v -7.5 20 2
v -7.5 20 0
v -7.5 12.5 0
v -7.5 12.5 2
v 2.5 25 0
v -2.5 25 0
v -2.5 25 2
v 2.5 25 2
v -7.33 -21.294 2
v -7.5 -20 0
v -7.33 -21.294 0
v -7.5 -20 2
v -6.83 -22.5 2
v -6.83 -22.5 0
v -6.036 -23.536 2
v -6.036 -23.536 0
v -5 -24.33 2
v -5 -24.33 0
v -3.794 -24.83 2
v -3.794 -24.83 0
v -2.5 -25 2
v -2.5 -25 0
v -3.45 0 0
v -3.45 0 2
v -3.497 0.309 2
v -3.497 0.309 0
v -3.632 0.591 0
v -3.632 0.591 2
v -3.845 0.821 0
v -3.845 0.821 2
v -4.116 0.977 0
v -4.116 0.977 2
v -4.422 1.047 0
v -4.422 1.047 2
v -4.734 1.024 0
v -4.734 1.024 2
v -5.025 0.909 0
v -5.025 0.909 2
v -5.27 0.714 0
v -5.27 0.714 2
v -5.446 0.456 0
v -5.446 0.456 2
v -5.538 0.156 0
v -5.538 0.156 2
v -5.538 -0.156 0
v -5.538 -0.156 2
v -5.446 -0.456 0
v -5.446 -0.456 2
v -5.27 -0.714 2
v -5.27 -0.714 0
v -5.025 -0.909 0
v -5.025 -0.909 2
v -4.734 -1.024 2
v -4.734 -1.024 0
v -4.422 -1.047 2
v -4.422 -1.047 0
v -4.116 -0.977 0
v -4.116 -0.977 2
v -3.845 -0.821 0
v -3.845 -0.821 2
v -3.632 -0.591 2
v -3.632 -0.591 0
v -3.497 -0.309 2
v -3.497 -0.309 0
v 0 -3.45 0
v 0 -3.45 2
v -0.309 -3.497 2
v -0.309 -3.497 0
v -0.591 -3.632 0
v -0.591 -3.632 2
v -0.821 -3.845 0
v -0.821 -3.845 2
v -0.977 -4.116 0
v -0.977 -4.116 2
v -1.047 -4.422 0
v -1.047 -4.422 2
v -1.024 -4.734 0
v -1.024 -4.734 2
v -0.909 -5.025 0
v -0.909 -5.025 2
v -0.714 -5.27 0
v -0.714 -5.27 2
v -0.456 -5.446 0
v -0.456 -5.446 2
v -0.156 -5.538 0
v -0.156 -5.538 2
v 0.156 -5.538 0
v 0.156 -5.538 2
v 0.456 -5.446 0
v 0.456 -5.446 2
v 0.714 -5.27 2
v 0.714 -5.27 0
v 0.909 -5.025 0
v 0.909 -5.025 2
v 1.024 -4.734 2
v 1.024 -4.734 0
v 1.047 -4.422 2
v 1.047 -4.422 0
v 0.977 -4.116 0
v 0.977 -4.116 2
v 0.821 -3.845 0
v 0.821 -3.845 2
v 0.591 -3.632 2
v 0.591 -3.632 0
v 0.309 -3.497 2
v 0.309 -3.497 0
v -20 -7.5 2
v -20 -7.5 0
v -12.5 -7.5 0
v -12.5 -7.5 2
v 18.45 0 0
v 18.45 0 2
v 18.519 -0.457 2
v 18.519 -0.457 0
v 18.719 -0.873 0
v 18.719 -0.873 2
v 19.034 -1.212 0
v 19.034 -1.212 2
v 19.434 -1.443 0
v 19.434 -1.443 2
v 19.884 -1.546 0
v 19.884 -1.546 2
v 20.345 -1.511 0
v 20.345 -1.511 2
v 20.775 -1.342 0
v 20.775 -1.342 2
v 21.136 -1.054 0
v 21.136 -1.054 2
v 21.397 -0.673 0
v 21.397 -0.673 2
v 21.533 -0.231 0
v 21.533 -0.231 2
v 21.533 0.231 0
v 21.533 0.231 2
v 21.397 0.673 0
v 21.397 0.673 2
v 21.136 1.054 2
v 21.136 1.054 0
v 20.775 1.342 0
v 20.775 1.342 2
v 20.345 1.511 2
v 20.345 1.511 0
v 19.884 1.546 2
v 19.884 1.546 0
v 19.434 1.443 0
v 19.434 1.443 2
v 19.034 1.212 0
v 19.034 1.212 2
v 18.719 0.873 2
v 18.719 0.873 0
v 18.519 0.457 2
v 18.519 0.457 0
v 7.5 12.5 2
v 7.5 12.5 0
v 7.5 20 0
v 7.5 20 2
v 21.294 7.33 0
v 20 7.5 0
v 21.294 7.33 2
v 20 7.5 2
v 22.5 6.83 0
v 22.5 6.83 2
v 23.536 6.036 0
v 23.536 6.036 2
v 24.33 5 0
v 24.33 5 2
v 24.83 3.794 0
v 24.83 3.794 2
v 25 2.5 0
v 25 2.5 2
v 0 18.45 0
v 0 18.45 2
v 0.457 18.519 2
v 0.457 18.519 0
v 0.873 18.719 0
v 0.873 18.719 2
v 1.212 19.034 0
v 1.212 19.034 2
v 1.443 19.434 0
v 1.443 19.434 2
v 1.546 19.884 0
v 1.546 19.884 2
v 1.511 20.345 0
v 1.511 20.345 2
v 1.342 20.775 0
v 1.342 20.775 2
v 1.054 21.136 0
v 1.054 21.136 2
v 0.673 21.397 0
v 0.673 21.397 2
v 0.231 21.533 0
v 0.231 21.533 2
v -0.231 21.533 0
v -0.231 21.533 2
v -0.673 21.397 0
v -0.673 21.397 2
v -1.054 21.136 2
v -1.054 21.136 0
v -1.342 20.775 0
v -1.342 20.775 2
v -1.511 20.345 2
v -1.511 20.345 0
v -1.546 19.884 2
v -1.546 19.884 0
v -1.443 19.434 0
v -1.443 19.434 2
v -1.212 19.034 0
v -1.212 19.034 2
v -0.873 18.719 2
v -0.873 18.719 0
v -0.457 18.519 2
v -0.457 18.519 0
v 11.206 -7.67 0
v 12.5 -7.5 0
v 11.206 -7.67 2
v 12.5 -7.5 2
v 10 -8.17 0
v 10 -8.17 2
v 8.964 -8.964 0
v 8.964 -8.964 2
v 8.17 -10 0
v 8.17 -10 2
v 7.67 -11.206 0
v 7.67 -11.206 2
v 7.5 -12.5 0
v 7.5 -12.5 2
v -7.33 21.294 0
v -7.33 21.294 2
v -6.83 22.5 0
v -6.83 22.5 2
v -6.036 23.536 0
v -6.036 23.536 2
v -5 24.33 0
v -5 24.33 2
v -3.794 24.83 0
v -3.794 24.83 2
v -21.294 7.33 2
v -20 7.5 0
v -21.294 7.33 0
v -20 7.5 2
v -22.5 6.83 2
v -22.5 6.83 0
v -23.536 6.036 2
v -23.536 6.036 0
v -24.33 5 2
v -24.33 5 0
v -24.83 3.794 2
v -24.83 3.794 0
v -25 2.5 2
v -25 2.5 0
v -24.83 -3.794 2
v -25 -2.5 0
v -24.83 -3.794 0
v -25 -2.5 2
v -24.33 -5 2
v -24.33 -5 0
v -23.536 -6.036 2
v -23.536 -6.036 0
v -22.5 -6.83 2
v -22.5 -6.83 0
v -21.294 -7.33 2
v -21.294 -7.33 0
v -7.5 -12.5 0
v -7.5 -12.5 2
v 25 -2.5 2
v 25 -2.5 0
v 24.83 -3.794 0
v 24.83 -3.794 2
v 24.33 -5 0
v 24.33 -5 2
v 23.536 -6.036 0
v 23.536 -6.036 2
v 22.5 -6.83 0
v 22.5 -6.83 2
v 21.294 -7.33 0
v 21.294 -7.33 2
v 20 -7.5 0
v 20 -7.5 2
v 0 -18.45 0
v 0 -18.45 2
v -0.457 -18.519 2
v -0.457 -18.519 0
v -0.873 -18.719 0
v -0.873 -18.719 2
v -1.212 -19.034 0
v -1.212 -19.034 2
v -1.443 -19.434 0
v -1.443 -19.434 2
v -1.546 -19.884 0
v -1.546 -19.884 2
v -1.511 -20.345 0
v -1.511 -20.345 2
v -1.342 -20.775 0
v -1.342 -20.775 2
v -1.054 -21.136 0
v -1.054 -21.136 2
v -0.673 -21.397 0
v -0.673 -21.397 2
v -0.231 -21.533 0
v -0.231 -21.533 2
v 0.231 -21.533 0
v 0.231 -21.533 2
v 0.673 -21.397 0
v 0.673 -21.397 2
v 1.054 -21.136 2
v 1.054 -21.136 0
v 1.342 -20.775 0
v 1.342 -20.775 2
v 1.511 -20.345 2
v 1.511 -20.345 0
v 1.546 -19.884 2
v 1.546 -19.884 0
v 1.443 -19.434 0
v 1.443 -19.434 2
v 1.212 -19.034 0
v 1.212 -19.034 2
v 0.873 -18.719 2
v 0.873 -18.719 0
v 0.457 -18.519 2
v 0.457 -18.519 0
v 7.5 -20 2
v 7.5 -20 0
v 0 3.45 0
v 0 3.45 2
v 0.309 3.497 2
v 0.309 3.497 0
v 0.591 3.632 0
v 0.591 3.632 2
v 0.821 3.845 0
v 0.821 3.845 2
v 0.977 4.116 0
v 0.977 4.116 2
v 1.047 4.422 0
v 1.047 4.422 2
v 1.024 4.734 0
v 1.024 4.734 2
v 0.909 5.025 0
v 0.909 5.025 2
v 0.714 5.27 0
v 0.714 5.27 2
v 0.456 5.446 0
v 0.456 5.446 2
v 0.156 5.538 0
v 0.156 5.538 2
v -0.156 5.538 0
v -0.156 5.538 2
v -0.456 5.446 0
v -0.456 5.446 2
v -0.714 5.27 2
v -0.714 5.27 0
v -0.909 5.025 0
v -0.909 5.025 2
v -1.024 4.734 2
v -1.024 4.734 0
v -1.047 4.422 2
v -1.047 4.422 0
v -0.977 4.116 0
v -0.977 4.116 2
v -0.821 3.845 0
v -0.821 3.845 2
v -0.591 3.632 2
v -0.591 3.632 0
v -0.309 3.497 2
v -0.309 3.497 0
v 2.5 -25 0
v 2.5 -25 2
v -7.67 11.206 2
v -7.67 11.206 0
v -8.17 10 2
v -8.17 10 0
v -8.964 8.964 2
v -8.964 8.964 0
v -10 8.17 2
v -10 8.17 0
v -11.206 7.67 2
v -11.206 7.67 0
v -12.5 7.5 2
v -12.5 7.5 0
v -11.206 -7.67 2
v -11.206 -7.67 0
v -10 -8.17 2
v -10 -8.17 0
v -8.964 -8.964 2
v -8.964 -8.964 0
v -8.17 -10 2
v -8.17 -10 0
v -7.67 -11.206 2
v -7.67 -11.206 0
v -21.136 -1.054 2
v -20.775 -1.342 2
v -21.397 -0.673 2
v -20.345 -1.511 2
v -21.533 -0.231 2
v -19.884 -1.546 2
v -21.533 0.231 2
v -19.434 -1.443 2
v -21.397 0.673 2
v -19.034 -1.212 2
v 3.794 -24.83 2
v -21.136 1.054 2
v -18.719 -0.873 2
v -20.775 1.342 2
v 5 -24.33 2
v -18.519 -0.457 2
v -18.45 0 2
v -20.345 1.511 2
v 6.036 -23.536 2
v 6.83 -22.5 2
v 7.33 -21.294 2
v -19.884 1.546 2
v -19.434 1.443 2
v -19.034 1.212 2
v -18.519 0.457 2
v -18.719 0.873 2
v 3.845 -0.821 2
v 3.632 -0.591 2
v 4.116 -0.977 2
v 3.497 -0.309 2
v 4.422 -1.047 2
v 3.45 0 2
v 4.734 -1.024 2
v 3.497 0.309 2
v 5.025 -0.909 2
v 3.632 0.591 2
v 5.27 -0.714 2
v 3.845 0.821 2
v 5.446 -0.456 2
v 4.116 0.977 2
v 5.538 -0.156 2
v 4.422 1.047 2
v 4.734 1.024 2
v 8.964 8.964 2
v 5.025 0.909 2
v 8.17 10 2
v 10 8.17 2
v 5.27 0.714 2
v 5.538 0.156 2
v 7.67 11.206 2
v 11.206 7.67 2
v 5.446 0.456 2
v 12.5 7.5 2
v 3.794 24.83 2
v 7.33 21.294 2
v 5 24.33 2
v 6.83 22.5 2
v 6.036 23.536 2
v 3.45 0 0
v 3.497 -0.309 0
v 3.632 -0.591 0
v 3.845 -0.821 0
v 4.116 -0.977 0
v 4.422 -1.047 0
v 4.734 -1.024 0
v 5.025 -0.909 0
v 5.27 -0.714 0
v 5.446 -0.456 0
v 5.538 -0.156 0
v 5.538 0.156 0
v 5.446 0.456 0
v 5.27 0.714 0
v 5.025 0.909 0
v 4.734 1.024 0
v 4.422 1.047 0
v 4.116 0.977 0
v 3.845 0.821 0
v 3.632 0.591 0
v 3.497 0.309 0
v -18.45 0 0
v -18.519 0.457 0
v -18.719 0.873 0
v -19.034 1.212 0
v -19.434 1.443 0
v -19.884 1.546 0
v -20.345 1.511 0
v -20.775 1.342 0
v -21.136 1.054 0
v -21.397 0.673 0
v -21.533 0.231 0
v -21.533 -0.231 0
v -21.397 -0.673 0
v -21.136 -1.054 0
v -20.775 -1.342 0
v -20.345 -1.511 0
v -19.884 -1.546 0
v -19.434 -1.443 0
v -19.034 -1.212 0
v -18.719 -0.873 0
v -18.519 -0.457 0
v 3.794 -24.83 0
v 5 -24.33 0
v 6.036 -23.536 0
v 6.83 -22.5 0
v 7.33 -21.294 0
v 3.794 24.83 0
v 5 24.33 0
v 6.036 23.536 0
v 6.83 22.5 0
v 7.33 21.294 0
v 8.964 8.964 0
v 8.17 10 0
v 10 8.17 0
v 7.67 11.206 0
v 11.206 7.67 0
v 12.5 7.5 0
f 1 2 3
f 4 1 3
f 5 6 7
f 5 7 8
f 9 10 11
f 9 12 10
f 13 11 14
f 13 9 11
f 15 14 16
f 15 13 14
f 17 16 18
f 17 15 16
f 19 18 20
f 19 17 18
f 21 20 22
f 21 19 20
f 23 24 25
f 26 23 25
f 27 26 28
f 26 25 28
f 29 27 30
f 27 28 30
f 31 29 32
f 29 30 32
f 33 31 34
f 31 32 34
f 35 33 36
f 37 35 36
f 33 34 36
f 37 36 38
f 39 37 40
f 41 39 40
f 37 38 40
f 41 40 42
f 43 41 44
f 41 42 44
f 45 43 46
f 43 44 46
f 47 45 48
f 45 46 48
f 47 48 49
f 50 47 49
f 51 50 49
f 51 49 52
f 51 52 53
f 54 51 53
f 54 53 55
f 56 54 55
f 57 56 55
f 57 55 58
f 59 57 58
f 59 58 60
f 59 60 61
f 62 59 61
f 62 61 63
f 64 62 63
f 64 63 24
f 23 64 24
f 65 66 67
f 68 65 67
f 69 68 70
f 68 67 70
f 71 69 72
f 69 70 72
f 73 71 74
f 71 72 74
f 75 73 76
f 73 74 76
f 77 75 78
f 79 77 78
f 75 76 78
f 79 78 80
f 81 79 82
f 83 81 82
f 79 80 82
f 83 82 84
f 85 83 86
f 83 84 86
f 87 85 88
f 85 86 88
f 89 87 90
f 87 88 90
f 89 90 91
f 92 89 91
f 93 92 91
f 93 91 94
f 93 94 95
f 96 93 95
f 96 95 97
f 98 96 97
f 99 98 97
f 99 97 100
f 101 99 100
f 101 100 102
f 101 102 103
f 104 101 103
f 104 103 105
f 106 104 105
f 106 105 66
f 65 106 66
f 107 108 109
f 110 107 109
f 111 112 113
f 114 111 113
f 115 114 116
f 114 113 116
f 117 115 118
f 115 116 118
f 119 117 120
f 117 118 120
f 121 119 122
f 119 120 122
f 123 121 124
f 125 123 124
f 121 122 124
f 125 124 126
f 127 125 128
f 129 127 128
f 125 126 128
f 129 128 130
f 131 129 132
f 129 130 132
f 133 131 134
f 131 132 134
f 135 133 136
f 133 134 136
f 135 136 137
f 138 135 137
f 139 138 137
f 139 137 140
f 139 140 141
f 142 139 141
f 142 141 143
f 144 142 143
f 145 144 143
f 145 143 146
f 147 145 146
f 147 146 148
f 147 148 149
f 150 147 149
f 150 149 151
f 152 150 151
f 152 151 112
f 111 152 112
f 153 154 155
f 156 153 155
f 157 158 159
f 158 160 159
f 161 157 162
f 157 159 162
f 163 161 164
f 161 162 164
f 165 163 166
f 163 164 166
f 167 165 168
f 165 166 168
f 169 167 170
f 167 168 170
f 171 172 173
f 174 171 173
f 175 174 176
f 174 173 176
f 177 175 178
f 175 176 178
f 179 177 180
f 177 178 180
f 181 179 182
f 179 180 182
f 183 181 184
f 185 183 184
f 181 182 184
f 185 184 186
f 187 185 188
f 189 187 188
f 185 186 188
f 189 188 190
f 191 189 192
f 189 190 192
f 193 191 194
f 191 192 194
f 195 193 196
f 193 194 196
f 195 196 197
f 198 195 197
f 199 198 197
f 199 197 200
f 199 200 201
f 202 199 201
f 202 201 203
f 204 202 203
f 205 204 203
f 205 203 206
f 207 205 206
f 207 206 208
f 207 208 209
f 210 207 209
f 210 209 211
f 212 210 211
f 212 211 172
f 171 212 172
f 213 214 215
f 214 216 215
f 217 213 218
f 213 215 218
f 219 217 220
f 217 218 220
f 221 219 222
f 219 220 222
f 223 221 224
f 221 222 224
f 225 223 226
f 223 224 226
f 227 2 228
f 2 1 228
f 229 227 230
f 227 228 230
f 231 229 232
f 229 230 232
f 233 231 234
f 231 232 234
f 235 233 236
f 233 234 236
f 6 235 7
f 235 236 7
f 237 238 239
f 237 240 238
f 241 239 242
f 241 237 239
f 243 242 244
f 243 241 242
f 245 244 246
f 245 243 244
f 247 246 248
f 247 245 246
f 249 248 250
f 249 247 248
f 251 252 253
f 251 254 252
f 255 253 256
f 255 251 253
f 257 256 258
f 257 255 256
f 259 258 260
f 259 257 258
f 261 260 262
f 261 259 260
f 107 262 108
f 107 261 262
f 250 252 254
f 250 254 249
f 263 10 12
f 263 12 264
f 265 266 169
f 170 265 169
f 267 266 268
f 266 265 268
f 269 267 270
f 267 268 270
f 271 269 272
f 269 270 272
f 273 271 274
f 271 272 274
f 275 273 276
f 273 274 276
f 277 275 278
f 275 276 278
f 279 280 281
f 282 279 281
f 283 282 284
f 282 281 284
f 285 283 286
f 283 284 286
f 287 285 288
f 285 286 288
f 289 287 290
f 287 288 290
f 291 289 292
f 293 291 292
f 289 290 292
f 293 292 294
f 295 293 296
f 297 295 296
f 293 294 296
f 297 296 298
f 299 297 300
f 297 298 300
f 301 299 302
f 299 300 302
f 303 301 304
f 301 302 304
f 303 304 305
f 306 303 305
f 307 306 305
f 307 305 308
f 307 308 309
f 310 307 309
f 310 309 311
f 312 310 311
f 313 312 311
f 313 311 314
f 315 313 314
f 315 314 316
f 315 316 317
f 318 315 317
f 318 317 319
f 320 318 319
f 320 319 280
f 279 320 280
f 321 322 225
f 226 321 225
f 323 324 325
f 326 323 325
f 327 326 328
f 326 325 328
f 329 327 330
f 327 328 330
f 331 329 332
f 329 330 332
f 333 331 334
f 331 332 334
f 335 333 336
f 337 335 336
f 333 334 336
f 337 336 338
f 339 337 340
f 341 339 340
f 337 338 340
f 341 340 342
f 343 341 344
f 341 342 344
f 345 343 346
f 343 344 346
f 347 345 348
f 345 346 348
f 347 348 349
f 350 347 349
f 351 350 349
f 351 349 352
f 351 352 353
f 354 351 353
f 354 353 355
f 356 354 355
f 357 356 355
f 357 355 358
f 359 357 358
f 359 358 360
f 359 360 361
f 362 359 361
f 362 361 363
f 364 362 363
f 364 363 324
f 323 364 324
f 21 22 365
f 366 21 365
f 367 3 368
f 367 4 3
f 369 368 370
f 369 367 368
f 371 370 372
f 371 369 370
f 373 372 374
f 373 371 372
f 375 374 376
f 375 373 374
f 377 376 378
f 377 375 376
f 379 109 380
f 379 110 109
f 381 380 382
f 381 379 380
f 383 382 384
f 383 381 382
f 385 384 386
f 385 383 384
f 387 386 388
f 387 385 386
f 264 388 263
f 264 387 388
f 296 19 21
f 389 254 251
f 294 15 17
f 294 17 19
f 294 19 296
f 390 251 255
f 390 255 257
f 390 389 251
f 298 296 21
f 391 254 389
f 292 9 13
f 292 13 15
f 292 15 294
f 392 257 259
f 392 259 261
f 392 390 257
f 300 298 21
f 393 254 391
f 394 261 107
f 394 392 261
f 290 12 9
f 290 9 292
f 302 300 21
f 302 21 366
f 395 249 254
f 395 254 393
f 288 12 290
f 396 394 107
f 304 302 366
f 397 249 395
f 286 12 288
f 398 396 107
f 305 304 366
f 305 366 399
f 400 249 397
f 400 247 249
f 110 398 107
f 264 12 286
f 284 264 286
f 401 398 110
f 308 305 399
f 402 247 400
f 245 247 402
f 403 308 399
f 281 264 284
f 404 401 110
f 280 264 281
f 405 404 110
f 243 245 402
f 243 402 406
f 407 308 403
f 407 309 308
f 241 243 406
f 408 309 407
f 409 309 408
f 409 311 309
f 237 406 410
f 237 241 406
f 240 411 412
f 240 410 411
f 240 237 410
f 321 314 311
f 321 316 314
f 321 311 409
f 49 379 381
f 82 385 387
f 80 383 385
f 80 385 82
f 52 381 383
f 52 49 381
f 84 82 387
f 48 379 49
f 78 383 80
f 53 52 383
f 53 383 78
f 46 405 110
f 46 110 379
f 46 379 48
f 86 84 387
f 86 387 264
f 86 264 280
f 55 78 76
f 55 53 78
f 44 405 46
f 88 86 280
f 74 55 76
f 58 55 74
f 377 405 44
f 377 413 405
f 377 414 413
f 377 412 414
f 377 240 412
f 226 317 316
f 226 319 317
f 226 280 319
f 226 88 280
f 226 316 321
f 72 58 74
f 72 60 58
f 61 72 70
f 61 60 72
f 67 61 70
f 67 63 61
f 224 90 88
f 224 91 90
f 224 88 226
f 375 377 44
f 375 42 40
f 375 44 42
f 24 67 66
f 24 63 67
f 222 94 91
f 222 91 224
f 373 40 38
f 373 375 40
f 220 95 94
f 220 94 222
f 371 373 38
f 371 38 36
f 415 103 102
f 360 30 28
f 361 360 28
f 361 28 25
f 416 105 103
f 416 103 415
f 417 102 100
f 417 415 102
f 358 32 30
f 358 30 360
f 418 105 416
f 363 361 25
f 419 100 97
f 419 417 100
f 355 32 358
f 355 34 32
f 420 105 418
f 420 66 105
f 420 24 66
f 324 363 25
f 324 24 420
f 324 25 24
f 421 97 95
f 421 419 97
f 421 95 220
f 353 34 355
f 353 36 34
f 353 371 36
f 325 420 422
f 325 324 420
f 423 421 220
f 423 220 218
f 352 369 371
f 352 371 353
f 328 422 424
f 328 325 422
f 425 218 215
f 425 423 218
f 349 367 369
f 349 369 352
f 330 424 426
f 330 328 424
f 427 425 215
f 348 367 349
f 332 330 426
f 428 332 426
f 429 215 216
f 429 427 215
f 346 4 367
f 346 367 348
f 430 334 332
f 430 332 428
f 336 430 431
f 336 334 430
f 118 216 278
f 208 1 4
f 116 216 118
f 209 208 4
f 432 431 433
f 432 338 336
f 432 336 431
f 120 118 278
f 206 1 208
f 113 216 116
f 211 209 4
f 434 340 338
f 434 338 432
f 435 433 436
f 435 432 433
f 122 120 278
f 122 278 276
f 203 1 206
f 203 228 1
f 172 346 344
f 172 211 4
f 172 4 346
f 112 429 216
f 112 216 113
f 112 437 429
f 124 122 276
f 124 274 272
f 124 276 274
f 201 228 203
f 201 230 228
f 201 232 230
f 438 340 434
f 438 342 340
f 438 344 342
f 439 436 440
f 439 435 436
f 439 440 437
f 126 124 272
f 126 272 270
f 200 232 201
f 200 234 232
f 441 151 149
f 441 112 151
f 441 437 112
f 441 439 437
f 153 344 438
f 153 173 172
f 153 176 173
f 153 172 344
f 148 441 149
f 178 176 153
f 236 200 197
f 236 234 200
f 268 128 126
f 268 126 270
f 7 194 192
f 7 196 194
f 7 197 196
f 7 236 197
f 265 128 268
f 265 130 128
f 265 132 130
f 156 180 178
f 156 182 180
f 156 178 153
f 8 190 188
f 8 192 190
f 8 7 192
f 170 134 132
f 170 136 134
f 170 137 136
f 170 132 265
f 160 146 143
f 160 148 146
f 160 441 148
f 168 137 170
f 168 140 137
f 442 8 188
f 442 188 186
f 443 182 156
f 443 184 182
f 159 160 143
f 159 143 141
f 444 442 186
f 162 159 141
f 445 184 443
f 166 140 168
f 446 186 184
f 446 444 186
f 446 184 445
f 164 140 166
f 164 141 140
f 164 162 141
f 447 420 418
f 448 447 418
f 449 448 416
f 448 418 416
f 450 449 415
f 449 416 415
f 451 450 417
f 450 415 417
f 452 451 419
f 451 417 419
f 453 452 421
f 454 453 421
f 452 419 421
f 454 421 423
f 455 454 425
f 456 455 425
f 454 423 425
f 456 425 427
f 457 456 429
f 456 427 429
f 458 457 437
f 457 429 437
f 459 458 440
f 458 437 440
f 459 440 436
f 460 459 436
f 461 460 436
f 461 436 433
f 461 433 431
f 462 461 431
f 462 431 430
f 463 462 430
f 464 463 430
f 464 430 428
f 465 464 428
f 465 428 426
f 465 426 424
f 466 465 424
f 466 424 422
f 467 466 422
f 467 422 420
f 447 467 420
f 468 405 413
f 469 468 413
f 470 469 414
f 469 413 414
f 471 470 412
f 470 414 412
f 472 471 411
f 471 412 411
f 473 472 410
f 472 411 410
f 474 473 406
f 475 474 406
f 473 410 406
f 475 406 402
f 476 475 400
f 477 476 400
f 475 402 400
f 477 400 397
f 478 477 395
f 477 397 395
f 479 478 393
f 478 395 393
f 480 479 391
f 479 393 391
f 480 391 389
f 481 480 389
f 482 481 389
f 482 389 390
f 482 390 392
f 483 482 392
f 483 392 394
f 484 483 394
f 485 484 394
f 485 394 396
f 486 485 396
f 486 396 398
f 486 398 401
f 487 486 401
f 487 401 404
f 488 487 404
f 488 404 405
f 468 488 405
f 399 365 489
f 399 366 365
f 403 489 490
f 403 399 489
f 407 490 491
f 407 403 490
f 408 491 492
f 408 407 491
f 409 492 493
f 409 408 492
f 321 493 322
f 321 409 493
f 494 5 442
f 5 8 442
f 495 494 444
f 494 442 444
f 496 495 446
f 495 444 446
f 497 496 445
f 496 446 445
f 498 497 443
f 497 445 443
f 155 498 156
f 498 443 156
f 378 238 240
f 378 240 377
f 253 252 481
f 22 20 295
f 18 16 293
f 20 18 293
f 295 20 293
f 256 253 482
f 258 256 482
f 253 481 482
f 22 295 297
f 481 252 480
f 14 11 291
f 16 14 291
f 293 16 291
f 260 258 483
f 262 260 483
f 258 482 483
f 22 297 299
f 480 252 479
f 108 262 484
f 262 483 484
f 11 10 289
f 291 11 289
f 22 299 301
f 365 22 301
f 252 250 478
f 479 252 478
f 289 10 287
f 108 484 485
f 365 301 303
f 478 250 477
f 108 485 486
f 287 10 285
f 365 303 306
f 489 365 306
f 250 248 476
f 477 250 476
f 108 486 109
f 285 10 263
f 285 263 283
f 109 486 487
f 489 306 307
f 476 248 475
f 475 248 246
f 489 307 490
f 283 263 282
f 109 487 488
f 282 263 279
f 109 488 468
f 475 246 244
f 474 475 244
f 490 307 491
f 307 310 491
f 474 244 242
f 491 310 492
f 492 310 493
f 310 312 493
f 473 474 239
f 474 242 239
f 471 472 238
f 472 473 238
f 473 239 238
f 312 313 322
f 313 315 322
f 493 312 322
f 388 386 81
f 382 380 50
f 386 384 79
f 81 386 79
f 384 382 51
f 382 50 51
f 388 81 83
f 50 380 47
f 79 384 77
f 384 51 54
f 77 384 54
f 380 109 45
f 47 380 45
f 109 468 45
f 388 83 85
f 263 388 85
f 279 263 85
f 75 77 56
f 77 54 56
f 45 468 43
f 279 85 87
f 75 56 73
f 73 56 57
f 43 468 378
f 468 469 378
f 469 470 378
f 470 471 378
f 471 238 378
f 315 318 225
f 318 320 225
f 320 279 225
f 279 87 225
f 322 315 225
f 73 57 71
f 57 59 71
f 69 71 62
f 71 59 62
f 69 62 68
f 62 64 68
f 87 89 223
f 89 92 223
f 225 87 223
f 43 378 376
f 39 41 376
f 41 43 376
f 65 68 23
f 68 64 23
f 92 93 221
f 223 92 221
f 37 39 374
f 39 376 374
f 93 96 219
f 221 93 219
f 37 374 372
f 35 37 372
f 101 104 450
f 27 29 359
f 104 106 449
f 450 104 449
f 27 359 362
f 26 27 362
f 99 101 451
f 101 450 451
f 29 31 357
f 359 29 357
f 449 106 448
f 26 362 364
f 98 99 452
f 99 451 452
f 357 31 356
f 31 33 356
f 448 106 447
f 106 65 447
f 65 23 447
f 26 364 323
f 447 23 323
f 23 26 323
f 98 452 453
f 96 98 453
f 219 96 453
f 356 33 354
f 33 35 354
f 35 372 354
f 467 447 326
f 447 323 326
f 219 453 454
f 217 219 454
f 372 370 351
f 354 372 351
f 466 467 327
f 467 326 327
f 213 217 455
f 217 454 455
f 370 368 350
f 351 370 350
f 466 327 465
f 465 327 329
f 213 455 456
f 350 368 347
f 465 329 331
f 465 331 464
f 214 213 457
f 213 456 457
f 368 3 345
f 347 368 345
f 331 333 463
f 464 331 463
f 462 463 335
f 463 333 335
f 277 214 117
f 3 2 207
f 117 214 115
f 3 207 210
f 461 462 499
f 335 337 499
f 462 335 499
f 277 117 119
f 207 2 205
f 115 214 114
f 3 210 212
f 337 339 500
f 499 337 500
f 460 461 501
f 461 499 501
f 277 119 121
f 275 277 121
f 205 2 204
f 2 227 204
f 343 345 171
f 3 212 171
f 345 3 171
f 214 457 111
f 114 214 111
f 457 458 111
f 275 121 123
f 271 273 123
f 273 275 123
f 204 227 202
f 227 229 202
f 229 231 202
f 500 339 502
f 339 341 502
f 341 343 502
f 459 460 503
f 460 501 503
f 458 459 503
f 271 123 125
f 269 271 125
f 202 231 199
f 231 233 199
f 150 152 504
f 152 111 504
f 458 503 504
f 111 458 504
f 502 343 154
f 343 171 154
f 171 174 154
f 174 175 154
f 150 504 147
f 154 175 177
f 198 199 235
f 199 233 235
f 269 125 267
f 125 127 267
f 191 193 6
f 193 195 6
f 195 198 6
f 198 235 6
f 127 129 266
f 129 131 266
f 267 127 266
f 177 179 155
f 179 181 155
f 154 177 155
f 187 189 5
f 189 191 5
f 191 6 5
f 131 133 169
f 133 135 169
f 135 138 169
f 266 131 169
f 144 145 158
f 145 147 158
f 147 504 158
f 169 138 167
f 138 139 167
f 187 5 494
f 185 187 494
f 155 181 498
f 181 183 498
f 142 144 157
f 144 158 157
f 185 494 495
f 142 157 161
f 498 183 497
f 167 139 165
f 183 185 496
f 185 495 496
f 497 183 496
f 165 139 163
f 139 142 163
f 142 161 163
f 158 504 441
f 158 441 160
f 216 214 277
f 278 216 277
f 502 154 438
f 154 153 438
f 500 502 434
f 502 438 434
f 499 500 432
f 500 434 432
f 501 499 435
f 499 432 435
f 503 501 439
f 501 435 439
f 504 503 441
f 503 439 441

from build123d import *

# Parameters (mm, degrees)
F0_W            = 15
F0_H            = 17.5
F0_H_2          = 15
F0_W_2          = 17.5
F1_DEPTH        = 2
F2_R            = 1.05
F2_R_2          = 1.55
F3_DEPTH        = 25
F3_COPIES_COUNT = 4
F4_R            = 5


# Not quite as in the source:
# - a pattern or mirror of a feature is missing from the dataset's text; its kind, count and spacing are read off the source's solid


with BuildPart() as f1:
    # F0 (on Top) → F1 (new body)
    with BuildSketch(Plane.XY):
        with Locations((0, 16.25)):
            Rectangle(F0_W, F0_H)
        Rectangle(F0_W, F0_H_2)
        with Locations((-16.25, 0)):
            Rectangle(F0_W_2, F0_H_2)
        with Locations((16.25, 0)):
            Rectangle(F0_W_2, F0_H_2)
        with Locations((0, -16.25)):
            Rectangle(F0_W, F0_H)
    extrude(amount=F1_DEPTH)

    # F2 (on face) → F3 (cut)
    with BuildSketch(Plane.XY.offset(2)):
        with Locations((-4.5, 0)):
            Circle(F2_R)
        with Locations((-20, 0)):
            Circle(F2_R_2)
    f3 = extrude(amount=-F3_DEPTH, mode=Mode.SUBTRACT)

    # F3_copies: F3 ×4 about axis
    f3_copies_axis = Axis((0, 0, 0), (0, 0, 1))
    for i in range(1, F3_COPIES_COUNT):
        add(f3.rotate(f3_copies_axis, i * 360 / F3_COPIES_COUNT), mode=Mode.SUBTRACT)

    # F4
    f4_edges = [f1.edges().sort_by_distance(p)[0] for p in [
        (7.5, -25, 1),
        (-7.5, -25, 1),
        (-7.5, -7.5, 1),
        (-25, -7.5, 1),
        (-25, 7.5, 1),
        (-7.5, 7.5, 1),
        (-7.5, 25, 1),
        (7.5, 25, 1),
        (25, 7.5, 1),
        (7.5, 7.5, 1),
        (25, -7.5, 1),
        (7.5, -7.5, 1),
    ]]
    fillet(f4_edges, radius=F4_R)


solid = f1.part
